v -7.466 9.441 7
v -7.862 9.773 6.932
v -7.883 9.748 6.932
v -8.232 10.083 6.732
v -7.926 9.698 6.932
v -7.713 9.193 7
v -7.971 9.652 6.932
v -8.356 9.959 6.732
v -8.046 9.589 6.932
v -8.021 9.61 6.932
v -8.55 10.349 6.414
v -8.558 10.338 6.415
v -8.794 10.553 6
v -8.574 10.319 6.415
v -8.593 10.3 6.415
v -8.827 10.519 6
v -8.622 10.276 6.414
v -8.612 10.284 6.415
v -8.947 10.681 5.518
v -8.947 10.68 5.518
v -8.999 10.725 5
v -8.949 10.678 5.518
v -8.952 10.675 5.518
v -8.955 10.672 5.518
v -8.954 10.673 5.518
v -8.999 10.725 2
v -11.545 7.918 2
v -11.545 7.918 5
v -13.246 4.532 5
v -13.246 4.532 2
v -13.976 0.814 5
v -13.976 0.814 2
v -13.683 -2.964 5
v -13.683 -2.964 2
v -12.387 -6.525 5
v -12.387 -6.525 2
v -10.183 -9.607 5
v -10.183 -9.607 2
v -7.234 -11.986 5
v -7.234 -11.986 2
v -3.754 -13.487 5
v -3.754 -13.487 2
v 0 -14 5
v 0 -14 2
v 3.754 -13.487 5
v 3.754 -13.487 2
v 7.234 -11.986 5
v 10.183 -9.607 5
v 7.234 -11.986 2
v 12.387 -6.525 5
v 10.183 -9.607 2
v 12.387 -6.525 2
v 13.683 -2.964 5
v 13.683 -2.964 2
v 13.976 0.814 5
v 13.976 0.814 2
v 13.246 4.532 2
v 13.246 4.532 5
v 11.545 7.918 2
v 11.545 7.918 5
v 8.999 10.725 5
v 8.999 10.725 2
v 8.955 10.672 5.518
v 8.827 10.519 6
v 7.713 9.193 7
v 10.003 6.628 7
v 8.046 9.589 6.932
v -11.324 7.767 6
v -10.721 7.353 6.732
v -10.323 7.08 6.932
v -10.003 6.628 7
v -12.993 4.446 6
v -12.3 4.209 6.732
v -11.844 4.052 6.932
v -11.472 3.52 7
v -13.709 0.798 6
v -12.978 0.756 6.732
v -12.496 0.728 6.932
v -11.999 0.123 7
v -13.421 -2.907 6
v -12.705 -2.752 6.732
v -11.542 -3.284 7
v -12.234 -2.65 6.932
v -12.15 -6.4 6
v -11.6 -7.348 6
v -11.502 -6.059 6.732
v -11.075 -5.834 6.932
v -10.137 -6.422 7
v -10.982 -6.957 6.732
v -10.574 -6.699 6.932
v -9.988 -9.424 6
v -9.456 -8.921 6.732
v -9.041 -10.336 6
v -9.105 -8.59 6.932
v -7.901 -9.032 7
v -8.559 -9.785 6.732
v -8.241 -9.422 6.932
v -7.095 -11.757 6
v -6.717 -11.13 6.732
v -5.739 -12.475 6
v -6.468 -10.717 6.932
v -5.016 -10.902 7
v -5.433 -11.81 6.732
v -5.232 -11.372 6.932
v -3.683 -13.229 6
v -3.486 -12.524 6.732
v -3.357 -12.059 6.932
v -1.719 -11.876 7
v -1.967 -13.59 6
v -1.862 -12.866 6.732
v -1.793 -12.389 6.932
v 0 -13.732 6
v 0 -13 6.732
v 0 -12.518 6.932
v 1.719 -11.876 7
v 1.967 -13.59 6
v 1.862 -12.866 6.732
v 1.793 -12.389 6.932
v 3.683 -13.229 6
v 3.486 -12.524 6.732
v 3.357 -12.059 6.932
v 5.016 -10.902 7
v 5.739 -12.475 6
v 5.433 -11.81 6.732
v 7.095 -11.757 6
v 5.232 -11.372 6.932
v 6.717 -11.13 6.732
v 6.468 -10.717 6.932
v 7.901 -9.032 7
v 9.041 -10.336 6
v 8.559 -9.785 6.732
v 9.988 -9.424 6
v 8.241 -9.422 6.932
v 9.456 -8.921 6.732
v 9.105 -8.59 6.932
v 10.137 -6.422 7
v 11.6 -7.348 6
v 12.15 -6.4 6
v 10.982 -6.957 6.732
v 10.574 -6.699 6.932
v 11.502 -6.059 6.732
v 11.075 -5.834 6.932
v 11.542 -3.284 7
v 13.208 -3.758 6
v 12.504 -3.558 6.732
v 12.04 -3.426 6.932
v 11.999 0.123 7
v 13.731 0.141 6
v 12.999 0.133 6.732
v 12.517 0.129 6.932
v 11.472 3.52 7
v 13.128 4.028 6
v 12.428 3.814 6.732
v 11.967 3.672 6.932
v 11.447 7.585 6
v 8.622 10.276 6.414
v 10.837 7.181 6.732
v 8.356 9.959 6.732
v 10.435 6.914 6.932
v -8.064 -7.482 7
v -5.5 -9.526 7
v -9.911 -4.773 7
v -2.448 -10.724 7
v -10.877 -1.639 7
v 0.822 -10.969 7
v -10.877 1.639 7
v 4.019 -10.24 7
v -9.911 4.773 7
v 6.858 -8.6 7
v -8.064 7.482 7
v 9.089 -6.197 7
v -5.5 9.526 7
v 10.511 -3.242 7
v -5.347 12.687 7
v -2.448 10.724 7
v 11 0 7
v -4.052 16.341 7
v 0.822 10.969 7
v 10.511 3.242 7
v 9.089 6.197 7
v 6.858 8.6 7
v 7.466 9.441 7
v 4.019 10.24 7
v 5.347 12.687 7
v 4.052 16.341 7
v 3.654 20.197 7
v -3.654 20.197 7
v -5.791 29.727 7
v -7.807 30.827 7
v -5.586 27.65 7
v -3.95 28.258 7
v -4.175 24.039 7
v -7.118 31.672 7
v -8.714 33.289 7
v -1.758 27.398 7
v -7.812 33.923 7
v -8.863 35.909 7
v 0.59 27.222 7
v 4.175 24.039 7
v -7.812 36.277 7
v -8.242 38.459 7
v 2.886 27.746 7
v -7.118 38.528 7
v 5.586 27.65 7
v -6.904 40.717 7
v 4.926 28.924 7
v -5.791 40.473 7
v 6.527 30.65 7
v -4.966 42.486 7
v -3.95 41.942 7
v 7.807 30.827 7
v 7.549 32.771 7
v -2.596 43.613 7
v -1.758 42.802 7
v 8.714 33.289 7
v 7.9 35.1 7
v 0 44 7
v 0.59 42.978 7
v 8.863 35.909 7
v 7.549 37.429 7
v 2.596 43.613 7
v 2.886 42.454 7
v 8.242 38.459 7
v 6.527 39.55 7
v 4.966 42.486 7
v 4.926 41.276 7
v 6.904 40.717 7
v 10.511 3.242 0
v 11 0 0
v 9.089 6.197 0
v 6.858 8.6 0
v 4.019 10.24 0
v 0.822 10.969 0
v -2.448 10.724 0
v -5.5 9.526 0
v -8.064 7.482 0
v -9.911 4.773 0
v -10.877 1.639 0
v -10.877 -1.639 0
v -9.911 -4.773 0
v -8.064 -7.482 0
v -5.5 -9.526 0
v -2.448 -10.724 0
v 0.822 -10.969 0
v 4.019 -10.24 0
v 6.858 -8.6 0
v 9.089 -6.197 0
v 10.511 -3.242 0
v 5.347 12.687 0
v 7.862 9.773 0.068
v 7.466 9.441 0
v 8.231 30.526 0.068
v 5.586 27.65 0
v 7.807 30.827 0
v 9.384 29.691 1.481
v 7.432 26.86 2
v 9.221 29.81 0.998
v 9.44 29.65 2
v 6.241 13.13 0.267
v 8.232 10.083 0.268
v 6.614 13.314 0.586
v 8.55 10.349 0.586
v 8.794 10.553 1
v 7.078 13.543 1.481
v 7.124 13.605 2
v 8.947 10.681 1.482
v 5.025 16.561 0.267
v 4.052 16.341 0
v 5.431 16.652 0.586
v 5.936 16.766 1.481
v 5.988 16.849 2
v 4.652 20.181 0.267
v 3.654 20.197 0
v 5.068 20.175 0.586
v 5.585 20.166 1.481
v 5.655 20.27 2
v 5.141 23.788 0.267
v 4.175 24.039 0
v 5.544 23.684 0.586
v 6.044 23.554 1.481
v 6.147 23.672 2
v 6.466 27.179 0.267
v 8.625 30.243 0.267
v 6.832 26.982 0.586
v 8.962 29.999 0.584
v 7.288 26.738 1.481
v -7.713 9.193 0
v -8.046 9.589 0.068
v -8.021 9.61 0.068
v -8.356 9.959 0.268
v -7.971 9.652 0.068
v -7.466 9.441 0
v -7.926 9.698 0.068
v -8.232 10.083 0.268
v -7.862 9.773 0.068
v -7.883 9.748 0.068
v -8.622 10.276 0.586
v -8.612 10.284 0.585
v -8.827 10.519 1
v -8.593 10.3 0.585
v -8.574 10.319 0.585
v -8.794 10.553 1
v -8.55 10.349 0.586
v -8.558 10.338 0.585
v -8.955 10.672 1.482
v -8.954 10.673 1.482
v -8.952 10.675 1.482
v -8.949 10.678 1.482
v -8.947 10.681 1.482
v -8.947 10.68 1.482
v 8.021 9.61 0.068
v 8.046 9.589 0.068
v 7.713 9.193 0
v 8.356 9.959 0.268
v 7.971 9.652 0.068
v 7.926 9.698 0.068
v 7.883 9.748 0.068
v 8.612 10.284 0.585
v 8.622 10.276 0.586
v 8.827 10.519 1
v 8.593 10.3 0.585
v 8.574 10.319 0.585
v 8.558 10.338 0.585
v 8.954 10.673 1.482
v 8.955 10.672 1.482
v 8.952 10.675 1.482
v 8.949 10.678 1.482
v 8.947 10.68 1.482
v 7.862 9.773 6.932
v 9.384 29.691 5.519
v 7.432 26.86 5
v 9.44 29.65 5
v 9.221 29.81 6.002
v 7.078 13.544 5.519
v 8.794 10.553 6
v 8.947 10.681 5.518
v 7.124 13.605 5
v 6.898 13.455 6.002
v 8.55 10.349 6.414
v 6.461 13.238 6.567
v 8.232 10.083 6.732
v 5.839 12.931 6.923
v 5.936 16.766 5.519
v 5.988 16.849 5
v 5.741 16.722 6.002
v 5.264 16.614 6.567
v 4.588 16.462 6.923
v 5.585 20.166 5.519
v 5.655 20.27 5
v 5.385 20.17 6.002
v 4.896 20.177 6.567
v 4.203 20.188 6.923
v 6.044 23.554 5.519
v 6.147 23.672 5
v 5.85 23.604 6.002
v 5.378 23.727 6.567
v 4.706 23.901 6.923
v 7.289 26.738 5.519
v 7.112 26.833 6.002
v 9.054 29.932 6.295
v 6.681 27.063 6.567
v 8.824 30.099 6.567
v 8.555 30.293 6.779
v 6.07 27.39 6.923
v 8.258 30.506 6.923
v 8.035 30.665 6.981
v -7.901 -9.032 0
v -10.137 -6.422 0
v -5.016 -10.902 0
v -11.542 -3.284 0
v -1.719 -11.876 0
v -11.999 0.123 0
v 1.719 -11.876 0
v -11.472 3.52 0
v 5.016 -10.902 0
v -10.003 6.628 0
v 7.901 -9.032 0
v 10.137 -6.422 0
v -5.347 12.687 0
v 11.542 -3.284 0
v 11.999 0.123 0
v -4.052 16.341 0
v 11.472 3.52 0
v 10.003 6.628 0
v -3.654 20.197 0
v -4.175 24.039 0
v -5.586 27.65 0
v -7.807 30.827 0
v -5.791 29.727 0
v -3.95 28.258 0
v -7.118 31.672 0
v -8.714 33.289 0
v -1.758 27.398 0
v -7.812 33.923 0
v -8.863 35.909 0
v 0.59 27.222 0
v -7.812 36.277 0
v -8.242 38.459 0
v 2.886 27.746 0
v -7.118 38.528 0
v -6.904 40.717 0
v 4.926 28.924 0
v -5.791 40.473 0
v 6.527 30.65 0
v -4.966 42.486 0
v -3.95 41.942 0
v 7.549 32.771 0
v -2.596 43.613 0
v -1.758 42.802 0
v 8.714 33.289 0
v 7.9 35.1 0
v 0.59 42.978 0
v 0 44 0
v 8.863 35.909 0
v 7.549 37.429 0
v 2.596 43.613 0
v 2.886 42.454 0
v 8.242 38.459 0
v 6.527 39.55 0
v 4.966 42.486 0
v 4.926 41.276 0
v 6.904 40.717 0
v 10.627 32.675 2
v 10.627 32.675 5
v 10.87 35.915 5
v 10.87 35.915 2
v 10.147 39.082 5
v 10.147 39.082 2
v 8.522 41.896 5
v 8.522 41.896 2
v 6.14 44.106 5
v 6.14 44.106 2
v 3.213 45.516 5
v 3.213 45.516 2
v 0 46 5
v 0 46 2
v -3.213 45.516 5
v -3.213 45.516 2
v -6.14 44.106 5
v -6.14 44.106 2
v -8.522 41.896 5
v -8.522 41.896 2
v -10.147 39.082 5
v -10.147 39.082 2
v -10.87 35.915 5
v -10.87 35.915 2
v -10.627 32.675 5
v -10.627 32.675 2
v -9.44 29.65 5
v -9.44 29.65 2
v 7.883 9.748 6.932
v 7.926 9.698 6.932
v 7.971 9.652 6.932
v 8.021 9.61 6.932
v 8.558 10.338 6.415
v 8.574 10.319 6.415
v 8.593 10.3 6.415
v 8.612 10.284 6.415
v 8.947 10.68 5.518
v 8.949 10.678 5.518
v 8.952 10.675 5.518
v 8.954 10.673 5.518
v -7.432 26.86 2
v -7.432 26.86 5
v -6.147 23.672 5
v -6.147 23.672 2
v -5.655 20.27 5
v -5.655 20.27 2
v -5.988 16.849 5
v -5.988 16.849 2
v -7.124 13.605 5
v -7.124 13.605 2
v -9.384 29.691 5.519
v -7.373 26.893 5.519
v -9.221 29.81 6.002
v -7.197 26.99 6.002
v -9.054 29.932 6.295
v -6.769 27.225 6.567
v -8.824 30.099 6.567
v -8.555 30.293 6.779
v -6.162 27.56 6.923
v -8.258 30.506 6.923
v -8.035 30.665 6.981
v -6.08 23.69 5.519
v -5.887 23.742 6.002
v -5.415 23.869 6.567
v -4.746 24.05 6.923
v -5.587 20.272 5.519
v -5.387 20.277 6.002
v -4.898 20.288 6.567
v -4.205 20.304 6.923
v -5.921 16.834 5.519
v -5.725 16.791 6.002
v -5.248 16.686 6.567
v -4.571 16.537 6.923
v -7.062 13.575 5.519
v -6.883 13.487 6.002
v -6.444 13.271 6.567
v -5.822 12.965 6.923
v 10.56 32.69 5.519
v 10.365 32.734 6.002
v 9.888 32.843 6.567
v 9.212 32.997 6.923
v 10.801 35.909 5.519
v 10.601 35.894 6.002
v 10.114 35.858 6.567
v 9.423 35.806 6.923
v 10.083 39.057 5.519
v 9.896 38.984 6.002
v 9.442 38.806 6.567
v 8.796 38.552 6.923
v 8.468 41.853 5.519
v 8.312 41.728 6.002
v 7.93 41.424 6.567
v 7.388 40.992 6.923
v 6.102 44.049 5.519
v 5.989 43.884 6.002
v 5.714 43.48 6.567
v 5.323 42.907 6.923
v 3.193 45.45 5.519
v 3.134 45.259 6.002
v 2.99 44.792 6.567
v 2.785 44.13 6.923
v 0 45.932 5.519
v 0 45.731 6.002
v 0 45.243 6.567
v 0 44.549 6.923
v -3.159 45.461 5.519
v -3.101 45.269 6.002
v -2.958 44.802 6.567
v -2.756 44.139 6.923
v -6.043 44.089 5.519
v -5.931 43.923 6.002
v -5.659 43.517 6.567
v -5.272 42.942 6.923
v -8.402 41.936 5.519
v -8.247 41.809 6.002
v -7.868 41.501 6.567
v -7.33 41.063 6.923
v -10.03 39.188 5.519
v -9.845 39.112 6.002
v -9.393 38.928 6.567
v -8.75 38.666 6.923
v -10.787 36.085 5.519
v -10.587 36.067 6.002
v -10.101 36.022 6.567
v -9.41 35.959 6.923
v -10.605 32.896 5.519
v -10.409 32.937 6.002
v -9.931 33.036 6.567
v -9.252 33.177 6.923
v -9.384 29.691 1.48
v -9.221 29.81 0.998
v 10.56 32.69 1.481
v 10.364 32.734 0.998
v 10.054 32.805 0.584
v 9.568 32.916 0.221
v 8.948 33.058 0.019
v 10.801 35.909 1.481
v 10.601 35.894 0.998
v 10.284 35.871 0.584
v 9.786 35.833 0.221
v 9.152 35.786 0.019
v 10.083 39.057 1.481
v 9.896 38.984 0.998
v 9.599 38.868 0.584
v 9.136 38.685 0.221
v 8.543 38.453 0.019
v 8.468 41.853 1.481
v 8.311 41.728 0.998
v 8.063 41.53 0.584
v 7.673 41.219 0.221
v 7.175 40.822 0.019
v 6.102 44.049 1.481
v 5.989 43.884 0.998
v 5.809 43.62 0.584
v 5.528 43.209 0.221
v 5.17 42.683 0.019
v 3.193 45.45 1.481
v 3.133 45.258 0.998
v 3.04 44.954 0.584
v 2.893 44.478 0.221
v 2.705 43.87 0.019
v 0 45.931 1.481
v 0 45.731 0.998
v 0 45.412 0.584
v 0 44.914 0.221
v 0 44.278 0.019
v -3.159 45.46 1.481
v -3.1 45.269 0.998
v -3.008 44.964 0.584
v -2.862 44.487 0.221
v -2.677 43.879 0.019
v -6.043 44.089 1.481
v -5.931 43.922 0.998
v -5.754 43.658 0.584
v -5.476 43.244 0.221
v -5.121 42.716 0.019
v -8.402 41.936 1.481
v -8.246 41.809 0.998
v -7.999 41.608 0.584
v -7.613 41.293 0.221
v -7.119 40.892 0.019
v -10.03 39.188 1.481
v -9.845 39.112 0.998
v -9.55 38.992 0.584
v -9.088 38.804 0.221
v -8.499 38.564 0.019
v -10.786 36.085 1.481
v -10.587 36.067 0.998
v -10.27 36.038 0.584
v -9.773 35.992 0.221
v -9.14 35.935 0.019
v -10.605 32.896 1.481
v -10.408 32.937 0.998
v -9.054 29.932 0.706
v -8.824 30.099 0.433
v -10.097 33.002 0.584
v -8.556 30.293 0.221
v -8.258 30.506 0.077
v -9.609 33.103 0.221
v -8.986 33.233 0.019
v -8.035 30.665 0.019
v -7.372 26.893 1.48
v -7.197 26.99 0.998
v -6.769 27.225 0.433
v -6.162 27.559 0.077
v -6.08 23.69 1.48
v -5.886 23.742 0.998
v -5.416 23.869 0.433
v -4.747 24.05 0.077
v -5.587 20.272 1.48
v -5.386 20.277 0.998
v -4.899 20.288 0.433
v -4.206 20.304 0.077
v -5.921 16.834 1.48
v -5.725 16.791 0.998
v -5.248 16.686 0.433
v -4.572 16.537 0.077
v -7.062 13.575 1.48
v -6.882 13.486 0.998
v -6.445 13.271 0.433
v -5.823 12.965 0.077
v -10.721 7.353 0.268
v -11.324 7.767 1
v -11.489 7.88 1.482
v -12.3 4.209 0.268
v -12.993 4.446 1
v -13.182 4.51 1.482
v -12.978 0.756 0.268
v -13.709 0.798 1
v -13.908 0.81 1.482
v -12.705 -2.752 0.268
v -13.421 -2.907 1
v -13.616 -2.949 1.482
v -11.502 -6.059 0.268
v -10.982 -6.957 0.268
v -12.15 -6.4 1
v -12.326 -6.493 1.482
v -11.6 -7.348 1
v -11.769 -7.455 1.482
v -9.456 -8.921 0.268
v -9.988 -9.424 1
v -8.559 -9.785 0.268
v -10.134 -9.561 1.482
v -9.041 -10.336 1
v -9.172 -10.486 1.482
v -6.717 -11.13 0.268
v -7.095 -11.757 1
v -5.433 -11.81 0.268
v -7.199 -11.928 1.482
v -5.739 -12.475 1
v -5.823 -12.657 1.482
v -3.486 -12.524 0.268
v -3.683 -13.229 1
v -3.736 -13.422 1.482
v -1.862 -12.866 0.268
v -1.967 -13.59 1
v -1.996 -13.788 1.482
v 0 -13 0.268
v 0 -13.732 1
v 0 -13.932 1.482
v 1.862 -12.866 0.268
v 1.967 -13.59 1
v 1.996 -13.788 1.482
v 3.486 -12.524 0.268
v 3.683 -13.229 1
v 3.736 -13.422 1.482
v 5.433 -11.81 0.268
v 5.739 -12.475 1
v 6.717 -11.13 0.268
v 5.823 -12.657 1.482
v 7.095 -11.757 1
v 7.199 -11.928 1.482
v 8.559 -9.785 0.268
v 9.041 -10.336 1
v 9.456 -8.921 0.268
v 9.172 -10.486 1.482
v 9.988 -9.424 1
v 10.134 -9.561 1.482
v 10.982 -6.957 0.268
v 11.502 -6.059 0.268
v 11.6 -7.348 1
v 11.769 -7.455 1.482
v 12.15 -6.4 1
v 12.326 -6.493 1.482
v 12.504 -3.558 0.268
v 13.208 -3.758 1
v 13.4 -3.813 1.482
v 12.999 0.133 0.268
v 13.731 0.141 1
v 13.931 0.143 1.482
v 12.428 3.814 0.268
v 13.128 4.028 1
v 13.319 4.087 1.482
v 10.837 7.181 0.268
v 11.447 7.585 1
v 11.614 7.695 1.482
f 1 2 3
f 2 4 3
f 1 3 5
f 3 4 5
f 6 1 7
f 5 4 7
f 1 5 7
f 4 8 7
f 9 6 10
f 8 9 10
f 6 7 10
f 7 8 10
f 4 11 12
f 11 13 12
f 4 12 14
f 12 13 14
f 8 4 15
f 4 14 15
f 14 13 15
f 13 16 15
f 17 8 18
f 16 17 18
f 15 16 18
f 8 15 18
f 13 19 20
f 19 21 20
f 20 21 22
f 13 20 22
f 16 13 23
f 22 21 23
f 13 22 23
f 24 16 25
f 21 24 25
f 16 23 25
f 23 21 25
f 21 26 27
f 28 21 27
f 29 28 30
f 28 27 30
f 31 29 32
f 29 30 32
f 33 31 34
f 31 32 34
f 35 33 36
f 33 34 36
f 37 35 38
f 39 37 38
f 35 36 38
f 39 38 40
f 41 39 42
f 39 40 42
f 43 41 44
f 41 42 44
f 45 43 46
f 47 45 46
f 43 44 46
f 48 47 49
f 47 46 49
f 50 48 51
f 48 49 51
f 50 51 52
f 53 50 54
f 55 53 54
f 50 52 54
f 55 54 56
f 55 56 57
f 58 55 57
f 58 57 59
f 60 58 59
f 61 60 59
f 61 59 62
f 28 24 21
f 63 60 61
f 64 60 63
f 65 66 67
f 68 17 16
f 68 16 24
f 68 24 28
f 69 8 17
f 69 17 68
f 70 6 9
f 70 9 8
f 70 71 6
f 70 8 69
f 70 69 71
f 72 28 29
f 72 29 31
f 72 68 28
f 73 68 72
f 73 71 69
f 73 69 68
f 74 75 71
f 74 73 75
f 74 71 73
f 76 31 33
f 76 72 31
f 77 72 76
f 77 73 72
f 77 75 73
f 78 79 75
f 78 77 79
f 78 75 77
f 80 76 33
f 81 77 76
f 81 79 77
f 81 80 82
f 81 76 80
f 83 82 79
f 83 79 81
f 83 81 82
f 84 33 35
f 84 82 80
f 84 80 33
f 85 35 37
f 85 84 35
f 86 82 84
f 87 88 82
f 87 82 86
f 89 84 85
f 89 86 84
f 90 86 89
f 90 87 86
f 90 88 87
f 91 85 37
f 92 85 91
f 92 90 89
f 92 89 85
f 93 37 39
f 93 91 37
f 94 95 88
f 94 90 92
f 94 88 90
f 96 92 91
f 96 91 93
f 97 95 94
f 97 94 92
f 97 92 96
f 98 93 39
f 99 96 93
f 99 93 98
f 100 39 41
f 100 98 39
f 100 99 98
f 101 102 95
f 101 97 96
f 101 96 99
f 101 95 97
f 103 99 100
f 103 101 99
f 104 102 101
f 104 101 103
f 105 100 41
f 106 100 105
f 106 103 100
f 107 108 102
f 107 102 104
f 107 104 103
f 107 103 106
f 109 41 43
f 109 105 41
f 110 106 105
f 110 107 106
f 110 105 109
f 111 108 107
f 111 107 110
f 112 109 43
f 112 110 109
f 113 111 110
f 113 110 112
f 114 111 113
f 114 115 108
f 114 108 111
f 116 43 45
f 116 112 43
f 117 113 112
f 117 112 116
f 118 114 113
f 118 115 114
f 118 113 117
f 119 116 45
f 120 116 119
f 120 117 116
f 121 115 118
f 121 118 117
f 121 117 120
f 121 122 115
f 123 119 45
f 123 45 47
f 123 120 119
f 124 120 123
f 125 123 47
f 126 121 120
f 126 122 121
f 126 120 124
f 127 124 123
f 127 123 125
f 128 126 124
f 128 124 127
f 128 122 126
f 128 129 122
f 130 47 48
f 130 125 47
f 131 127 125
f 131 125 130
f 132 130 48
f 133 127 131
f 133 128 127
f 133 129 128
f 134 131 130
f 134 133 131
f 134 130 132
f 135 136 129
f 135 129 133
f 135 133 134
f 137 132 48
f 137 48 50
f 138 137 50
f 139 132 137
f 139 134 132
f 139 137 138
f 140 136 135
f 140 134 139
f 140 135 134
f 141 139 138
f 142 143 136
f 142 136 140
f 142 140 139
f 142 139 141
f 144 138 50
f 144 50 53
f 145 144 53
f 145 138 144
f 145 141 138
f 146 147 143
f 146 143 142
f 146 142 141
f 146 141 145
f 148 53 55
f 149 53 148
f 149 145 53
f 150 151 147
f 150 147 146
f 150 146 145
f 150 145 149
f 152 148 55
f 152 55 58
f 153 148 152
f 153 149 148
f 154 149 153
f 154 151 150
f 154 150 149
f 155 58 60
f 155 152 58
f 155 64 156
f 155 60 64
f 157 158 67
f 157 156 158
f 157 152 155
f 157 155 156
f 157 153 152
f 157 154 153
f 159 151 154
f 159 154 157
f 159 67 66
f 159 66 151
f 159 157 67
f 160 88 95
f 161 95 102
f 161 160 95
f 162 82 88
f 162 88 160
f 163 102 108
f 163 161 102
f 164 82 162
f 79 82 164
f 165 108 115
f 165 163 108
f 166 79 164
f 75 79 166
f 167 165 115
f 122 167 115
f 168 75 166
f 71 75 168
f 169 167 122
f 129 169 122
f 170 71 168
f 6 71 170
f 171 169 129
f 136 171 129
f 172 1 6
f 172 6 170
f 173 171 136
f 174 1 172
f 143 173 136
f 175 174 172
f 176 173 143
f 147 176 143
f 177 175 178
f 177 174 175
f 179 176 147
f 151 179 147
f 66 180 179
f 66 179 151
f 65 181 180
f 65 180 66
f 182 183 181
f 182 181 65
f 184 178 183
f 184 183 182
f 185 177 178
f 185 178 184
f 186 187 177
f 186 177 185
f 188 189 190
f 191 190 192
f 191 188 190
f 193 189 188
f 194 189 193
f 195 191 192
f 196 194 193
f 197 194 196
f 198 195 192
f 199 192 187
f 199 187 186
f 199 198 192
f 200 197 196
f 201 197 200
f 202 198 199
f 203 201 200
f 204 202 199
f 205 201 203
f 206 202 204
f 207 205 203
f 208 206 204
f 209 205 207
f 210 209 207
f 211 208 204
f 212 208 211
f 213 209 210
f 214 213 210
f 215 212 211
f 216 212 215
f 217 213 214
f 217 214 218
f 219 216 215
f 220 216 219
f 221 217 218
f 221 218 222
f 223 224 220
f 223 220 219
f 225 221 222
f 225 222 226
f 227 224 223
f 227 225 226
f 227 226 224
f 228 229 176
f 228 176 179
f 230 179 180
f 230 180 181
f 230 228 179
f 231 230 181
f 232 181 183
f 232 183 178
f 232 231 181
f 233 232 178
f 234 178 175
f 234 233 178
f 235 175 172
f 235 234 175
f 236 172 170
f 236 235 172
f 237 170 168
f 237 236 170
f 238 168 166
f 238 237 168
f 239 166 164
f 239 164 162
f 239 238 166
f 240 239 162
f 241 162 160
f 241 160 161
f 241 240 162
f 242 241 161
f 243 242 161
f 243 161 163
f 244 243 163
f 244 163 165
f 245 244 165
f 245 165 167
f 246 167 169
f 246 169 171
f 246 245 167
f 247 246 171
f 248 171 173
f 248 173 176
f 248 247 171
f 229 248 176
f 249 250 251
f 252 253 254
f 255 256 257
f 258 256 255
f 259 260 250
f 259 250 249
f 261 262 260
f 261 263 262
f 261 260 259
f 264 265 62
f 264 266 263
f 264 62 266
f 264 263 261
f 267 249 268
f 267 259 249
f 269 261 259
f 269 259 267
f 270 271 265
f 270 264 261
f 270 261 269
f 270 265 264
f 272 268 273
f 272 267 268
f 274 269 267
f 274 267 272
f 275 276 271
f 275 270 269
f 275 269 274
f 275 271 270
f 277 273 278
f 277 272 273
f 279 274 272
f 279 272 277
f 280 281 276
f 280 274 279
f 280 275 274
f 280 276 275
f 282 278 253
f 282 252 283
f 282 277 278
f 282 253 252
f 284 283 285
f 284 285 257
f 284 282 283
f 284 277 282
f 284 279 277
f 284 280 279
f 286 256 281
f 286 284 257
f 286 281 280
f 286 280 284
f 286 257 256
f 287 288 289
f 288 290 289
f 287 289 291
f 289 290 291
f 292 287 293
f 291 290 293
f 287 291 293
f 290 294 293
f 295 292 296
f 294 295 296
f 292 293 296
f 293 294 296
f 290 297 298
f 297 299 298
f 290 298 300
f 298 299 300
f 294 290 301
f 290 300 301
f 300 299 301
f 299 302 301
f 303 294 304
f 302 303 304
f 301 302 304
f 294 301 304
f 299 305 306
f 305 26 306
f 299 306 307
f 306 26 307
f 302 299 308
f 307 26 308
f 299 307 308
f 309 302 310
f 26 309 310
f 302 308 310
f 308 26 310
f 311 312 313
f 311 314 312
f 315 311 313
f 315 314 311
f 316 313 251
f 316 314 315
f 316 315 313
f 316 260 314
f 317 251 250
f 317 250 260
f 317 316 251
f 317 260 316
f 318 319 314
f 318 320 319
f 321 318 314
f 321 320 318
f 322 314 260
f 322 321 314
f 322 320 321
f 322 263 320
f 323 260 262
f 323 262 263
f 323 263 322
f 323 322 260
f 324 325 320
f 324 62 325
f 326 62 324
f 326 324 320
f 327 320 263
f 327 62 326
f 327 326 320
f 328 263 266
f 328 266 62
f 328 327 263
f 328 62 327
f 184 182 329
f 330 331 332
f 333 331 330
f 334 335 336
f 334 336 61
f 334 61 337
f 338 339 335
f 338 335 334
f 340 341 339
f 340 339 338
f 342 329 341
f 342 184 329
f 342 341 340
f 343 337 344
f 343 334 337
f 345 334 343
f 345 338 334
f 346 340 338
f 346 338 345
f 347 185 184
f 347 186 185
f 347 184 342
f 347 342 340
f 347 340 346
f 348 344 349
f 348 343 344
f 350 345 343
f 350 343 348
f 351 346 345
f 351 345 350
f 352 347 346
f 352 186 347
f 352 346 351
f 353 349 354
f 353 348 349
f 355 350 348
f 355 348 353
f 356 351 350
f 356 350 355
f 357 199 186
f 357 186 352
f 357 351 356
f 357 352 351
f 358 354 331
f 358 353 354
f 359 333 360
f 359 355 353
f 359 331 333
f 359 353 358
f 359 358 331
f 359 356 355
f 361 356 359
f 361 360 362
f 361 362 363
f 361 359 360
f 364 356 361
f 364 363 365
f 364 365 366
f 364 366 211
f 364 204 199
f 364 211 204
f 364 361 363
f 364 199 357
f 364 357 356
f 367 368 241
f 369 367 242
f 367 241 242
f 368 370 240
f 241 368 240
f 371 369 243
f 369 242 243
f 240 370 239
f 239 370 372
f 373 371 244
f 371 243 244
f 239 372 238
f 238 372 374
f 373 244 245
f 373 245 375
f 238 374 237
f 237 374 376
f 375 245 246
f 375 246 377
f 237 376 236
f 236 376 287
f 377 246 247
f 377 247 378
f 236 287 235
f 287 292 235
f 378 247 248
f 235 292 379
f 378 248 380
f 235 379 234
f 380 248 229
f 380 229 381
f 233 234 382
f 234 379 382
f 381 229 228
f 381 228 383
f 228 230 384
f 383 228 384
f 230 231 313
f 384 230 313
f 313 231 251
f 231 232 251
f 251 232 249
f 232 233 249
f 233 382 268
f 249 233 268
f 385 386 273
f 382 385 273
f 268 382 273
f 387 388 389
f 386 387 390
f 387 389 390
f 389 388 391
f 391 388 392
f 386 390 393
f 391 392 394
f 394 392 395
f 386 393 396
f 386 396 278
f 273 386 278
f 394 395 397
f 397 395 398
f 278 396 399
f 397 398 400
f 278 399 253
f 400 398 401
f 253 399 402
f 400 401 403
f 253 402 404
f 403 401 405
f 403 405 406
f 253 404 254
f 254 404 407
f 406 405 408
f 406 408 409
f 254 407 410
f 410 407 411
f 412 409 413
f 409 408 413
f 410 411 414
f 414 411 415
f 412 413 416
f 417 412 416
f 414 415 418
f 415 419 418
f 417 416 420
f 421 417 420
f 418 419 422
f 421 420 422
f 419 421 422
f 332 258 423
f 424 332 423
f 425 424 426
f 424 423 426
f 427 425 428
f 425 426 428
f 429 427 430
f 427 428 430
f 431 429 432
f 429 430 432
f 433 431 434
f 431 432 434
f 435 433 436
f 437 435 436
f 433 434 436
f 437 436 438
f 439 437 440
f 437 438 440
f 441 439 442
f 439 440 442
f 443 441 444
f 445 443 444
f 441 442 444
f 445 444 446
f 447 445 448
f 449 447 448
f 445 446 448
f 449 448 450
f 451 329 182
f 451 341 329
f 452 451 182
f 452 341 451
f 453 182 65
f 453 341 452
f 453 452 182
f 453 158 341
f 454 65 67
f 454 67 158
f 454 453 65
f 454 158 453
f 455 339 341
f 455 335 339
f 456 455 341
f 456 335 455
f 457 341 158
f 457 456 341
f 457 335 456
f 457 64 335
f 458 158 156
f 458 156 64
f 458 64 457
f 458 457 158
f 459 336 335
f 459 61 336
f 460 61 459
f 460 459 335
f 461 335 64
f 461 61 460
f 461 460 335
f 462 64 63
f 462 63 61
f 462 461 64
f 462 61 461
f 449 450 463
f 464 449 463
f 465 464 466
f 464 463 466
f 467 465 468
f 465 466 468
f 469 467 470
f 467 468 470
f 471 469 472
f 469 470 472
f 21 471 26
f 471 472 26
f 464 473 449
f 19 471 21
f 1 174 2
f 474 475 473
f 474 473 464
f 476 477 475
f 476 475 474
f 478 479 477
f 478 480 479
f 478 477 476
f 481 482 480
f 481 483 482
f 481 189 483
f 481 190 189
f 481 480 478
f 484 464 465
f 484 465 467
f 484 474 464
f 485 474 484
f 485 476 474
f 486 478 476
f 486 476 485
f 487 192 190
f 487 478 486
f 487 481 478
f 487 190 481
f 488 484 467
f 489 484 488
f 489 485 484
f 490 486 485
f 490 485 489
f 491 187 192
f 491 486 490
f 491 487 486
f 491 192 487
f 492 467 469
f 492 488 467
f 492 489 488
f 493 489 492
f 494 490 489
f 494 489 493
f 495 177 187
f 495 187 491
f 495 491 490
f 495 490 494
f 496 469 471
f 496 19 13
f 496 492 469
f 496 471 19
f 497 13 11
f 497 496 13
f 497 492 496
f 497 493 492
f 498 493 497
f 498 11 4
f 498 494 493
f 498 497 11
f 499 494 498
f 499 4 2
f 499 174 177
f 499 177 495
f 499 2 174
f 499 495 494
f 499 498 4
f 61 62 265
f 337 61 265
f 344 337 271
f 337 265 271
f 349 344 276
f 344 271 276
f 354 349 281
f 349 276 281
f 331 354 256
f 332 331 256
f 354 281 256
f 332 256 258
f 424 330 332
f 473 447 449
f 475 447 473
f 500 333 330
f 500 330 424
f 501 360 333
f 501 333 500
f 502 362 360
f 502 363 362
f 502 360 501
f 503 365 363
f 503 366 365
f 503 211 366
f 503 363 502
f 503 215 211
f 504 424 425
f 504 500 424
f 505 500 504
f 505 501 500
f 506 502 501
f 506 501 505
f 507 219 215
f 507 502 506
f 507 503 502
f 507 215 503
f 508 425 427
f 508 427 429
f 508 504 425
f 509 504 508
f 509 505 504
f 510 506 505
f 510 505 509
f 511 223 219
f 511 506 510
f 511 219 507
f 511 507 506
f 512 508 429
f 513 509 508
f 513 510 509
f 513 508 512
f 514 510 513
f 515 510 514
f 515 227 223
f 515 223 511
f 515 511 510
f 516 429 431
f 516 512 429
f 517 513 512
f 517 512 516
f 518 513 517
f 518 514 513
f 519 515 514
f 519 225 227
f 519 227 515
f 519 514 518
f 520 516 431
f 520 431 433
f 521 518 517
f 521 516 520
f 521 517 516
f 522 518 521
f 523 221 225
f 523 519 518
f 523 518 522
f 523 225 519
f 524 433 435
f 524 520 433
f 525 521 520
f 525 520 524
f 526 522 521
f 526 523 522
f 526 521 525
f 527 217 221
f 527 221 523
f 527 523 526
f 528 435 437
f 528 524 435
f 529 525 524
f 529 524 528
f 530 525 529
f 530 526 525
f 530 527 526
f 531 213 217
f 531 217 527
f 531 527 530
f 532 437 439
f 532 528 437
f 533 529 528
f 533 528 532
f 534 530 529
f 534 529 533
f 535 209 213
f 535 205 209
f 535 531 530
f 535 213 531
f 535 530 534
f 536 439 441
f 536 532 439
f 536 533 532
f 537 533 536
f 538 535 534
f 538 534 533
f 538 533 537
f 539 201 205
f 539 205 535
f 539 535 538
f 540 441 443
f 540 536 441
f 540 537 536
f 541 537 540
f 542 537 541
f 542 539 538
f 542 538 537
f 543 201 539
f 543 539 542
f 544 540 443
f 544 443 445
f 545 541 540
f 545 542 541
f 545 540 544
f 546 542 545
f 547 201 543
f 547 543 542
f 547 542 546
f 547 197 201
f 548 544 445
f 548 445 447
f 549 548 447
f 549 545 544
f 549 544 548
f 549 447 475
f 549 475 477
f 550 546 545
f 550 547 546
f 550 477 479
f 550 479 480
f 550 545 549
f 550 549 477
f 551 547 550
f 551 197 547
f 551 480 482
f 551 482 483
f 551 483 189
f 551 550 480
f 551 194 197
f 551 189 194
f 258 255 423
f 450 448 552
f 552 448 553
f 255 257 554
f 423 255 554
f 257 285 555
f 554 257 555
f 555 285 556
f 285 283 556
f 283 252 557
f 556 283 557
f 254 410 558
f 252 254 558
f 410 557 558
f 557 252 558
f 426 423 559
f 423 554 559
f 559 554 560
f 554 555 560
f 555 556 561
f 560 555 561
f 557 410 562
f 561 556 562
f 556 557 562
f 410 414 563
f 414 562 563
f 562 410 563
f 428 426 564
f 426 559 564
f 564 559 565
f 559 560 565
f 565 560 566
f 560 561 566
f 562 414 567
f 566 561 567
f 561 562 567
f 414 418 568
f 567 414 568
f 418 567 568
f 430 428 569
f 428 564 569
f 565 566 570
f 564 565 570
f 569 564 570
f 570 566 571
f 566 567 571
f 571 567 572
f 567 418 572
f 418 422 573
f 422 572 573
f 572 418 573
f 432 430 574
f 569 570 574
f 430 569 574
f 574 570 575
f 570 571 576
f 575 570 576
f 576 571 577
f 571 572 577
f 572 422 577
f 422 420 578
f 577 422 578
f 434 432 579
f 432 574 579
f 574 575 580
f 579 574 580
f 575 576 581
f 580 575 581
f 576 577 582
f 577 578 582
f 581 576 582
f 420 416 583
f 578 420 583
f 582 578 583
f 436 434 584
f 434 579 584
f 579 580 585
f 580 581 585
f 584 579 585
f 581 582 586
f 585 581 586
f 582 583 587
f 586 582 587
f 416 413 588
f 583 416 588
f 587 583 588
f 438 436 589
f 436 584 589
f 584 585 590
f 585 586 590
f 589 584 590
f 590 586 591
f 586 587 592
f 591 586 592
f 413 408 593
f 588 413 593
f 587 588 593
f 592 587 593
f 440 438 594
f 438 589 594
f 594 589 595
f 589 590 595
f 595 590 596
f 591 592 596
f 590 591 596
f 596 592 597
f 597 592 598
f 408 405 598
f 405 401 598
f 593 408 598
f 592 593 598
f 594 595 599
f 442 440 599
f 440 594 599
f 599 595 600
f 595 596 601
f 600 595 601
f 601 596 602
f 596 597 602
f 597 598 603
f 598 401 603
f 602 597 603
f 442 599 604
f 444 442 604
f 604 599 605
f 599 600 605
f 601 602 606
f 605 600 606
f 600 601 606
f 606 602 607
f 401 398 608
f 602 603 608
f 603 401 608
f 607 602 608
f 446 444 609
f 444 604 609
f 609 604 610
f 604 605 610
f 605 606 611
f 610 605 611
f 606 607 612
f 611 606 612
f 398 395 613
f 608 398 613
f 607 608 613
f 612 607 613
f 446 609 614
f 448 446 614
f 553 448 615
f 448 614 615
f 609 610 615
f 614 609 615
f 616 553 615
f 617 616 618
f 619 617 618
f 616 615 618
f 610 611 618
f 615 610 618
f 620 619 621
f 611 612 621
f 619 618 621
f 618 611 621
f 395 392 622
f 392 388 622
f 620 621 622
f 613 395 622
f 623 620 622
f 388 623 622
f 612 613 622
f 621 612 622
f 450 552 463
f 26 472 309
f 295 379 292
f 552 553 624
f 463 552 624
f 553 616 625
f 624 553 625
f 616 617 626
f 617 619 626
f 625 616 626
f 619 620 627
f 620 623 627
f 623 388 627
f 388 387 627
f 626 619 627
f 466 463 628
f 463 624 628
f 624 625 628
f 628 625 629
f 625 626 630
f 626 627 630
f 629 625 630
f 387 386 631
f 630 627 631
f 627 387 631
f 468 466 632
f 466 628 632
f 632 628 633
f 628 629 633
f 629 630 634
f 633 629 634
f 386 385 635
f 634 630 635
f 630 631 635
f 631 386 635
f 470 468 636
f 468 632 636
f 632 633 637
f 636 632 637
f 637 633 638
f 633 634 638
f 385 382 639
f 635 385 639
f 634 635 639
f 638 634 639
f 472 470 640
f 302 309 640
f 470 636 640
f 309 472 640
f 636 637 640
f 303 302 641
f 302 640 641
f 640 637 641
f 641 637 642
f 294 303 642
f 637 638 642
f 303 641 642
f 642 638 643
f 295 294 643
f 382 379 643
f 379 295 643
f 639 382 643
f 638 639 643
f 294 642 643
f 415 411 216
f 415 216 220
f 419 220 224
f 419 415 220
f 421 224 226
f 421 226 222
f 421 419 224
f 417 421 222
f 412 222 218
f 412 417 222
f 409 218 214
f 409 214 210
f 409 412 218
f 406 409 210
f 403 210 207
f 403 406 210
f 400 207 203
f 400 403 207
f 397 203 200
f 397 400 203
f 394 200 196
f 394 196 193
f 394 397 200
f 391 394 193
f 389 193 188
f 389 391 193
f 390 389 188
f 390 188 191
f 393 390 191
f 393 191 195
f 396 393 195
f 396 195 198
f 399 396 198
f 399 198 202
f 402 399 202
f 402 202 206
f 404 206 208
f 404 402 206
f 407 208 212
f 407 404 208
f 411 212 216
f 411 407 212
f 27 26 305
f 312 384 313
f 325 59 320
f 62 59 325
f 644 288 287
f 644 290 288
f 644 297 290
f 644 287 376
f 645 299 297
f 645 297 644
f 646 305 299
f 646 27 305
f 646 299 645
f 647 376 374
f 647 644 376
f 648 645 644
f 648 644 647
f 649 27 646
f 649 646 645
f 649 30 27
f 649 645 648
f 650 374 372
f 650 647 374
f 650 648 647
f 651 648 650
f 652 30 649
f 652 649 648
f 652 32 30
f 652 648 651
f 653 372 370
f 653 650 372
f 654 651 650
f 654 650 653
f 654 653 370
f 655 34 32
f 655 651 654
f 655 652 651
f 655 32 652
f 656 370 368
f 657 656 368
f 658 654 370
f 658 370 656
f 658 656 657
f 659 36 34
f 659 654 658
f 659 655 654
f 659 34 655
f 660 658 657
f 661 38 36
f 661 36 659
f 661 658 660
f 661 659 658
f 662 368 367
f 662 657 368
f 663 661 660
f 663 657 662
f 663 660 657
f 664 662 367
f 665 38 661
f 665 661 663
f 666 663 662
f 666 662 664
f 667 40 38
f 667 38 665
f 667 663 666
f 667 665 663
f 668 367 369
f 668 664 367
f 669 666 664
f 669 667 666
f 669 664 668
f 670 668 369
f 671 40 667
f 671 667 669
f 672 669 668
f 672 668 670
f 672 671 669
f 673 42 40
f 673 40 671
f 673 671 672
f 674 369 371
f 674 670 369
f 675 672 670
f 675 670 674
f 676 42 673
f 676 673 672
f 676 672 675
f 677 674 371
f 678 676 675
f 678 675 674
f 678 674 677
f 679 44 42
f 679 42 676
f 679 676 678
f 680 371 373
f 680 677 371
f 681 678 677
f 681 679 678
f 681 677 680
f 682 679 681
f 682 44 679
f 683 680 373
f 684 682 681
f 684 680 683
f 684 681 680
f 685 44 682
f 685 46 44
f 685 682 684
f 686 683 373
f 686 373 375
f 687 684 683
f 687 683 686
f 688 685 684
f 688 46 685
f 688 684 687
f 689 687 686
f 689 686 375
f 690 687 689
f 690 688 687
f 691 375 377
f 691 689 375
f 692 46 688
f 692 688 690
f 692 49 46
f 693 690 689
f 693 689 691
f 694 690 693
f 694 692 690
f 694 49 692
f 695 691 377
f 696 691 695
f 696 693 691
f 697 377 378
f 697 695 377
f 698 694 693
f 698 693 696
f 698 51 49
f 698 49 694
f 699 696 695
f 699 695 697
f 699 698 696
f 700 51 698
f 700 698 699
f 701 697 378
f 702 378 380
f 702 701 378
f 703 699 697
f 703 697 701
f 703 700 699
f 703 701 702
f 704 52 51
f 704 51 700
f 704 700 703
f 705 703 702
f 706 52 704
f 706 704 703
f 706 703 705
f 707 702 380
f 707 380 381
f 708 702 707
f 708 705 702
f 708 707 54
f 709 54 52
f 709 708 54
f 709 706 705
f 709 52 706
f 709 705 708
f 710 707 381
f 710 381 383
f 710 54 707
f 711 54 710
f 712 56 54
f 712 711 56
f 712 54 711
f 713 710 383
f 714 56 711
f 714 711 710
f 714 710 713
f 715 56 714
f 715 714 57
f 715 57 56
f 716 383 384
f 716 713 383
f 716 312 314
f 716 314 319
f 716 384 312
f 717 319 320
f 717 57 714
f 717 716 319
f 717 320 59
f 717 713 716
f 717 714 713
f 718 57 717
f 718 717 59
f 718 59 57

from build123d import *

# Parameters (mm, degrees)
F0_R     = 11
F0_R_2   = 7.9
F1_DEPTH = 7
F2_R     = 2


with BuildPart() as f1:
    # F0 (on Top) → F1 (new body)
    with BuildSketch(Plane.XY):
        with BuildLine():
            ThreePointArc((-9.4396769012, 29.65), (-5.6554937849, 20.2702904388), (-8.9990265356, 10.7246222037))
            ThreePointArc((-8.9990265356, 10.7246222037), (0, -14), (8.9990265356, 10.7246222037))
            ThreePointArc((8.9990265356, 10.7246222037), (5.6554937849, 20.2702904388), (9.4396769012, 29.65))
            ThreePointArc((9.4396769012, 29.65), (0, 46), (-9.4396769012, 29.65))
        make_face()
        Circle(F0_R, mode=Mode.SUBTRACT)
        with Locations((0, 35.1)):
            Circle(F0_R_2, mode=Mode.SUBTRACT)
    extrude(amount=F1_DEPTH)

    # F2 (call 1 of 2: OpenCascade refuses the feature's edges together)
    f2_edges = [f1.edges().sort_by_distance(p)[0] for p in [
        (-5.655494, 20.27029, 7),
        (0, 46, 7),
        (5.655494, 20.27029, 7),
        (0, -14, 7),
    ]]
    fillet(f2_edges, radius=F2_R)

    # F2#2 (call 2 of 2)
    f2_2_edges = [f1.edges().sort_by_distance(p)[0] for p in [
        (0, -14, 0),
        (5.655494, 20.27029, 0),
        (0, 46, 0),
        (-5.655494, 20.27029, 0),
    ]]
    fillet(f2_2_edges, radius=F2_R)


solid = f1.part
